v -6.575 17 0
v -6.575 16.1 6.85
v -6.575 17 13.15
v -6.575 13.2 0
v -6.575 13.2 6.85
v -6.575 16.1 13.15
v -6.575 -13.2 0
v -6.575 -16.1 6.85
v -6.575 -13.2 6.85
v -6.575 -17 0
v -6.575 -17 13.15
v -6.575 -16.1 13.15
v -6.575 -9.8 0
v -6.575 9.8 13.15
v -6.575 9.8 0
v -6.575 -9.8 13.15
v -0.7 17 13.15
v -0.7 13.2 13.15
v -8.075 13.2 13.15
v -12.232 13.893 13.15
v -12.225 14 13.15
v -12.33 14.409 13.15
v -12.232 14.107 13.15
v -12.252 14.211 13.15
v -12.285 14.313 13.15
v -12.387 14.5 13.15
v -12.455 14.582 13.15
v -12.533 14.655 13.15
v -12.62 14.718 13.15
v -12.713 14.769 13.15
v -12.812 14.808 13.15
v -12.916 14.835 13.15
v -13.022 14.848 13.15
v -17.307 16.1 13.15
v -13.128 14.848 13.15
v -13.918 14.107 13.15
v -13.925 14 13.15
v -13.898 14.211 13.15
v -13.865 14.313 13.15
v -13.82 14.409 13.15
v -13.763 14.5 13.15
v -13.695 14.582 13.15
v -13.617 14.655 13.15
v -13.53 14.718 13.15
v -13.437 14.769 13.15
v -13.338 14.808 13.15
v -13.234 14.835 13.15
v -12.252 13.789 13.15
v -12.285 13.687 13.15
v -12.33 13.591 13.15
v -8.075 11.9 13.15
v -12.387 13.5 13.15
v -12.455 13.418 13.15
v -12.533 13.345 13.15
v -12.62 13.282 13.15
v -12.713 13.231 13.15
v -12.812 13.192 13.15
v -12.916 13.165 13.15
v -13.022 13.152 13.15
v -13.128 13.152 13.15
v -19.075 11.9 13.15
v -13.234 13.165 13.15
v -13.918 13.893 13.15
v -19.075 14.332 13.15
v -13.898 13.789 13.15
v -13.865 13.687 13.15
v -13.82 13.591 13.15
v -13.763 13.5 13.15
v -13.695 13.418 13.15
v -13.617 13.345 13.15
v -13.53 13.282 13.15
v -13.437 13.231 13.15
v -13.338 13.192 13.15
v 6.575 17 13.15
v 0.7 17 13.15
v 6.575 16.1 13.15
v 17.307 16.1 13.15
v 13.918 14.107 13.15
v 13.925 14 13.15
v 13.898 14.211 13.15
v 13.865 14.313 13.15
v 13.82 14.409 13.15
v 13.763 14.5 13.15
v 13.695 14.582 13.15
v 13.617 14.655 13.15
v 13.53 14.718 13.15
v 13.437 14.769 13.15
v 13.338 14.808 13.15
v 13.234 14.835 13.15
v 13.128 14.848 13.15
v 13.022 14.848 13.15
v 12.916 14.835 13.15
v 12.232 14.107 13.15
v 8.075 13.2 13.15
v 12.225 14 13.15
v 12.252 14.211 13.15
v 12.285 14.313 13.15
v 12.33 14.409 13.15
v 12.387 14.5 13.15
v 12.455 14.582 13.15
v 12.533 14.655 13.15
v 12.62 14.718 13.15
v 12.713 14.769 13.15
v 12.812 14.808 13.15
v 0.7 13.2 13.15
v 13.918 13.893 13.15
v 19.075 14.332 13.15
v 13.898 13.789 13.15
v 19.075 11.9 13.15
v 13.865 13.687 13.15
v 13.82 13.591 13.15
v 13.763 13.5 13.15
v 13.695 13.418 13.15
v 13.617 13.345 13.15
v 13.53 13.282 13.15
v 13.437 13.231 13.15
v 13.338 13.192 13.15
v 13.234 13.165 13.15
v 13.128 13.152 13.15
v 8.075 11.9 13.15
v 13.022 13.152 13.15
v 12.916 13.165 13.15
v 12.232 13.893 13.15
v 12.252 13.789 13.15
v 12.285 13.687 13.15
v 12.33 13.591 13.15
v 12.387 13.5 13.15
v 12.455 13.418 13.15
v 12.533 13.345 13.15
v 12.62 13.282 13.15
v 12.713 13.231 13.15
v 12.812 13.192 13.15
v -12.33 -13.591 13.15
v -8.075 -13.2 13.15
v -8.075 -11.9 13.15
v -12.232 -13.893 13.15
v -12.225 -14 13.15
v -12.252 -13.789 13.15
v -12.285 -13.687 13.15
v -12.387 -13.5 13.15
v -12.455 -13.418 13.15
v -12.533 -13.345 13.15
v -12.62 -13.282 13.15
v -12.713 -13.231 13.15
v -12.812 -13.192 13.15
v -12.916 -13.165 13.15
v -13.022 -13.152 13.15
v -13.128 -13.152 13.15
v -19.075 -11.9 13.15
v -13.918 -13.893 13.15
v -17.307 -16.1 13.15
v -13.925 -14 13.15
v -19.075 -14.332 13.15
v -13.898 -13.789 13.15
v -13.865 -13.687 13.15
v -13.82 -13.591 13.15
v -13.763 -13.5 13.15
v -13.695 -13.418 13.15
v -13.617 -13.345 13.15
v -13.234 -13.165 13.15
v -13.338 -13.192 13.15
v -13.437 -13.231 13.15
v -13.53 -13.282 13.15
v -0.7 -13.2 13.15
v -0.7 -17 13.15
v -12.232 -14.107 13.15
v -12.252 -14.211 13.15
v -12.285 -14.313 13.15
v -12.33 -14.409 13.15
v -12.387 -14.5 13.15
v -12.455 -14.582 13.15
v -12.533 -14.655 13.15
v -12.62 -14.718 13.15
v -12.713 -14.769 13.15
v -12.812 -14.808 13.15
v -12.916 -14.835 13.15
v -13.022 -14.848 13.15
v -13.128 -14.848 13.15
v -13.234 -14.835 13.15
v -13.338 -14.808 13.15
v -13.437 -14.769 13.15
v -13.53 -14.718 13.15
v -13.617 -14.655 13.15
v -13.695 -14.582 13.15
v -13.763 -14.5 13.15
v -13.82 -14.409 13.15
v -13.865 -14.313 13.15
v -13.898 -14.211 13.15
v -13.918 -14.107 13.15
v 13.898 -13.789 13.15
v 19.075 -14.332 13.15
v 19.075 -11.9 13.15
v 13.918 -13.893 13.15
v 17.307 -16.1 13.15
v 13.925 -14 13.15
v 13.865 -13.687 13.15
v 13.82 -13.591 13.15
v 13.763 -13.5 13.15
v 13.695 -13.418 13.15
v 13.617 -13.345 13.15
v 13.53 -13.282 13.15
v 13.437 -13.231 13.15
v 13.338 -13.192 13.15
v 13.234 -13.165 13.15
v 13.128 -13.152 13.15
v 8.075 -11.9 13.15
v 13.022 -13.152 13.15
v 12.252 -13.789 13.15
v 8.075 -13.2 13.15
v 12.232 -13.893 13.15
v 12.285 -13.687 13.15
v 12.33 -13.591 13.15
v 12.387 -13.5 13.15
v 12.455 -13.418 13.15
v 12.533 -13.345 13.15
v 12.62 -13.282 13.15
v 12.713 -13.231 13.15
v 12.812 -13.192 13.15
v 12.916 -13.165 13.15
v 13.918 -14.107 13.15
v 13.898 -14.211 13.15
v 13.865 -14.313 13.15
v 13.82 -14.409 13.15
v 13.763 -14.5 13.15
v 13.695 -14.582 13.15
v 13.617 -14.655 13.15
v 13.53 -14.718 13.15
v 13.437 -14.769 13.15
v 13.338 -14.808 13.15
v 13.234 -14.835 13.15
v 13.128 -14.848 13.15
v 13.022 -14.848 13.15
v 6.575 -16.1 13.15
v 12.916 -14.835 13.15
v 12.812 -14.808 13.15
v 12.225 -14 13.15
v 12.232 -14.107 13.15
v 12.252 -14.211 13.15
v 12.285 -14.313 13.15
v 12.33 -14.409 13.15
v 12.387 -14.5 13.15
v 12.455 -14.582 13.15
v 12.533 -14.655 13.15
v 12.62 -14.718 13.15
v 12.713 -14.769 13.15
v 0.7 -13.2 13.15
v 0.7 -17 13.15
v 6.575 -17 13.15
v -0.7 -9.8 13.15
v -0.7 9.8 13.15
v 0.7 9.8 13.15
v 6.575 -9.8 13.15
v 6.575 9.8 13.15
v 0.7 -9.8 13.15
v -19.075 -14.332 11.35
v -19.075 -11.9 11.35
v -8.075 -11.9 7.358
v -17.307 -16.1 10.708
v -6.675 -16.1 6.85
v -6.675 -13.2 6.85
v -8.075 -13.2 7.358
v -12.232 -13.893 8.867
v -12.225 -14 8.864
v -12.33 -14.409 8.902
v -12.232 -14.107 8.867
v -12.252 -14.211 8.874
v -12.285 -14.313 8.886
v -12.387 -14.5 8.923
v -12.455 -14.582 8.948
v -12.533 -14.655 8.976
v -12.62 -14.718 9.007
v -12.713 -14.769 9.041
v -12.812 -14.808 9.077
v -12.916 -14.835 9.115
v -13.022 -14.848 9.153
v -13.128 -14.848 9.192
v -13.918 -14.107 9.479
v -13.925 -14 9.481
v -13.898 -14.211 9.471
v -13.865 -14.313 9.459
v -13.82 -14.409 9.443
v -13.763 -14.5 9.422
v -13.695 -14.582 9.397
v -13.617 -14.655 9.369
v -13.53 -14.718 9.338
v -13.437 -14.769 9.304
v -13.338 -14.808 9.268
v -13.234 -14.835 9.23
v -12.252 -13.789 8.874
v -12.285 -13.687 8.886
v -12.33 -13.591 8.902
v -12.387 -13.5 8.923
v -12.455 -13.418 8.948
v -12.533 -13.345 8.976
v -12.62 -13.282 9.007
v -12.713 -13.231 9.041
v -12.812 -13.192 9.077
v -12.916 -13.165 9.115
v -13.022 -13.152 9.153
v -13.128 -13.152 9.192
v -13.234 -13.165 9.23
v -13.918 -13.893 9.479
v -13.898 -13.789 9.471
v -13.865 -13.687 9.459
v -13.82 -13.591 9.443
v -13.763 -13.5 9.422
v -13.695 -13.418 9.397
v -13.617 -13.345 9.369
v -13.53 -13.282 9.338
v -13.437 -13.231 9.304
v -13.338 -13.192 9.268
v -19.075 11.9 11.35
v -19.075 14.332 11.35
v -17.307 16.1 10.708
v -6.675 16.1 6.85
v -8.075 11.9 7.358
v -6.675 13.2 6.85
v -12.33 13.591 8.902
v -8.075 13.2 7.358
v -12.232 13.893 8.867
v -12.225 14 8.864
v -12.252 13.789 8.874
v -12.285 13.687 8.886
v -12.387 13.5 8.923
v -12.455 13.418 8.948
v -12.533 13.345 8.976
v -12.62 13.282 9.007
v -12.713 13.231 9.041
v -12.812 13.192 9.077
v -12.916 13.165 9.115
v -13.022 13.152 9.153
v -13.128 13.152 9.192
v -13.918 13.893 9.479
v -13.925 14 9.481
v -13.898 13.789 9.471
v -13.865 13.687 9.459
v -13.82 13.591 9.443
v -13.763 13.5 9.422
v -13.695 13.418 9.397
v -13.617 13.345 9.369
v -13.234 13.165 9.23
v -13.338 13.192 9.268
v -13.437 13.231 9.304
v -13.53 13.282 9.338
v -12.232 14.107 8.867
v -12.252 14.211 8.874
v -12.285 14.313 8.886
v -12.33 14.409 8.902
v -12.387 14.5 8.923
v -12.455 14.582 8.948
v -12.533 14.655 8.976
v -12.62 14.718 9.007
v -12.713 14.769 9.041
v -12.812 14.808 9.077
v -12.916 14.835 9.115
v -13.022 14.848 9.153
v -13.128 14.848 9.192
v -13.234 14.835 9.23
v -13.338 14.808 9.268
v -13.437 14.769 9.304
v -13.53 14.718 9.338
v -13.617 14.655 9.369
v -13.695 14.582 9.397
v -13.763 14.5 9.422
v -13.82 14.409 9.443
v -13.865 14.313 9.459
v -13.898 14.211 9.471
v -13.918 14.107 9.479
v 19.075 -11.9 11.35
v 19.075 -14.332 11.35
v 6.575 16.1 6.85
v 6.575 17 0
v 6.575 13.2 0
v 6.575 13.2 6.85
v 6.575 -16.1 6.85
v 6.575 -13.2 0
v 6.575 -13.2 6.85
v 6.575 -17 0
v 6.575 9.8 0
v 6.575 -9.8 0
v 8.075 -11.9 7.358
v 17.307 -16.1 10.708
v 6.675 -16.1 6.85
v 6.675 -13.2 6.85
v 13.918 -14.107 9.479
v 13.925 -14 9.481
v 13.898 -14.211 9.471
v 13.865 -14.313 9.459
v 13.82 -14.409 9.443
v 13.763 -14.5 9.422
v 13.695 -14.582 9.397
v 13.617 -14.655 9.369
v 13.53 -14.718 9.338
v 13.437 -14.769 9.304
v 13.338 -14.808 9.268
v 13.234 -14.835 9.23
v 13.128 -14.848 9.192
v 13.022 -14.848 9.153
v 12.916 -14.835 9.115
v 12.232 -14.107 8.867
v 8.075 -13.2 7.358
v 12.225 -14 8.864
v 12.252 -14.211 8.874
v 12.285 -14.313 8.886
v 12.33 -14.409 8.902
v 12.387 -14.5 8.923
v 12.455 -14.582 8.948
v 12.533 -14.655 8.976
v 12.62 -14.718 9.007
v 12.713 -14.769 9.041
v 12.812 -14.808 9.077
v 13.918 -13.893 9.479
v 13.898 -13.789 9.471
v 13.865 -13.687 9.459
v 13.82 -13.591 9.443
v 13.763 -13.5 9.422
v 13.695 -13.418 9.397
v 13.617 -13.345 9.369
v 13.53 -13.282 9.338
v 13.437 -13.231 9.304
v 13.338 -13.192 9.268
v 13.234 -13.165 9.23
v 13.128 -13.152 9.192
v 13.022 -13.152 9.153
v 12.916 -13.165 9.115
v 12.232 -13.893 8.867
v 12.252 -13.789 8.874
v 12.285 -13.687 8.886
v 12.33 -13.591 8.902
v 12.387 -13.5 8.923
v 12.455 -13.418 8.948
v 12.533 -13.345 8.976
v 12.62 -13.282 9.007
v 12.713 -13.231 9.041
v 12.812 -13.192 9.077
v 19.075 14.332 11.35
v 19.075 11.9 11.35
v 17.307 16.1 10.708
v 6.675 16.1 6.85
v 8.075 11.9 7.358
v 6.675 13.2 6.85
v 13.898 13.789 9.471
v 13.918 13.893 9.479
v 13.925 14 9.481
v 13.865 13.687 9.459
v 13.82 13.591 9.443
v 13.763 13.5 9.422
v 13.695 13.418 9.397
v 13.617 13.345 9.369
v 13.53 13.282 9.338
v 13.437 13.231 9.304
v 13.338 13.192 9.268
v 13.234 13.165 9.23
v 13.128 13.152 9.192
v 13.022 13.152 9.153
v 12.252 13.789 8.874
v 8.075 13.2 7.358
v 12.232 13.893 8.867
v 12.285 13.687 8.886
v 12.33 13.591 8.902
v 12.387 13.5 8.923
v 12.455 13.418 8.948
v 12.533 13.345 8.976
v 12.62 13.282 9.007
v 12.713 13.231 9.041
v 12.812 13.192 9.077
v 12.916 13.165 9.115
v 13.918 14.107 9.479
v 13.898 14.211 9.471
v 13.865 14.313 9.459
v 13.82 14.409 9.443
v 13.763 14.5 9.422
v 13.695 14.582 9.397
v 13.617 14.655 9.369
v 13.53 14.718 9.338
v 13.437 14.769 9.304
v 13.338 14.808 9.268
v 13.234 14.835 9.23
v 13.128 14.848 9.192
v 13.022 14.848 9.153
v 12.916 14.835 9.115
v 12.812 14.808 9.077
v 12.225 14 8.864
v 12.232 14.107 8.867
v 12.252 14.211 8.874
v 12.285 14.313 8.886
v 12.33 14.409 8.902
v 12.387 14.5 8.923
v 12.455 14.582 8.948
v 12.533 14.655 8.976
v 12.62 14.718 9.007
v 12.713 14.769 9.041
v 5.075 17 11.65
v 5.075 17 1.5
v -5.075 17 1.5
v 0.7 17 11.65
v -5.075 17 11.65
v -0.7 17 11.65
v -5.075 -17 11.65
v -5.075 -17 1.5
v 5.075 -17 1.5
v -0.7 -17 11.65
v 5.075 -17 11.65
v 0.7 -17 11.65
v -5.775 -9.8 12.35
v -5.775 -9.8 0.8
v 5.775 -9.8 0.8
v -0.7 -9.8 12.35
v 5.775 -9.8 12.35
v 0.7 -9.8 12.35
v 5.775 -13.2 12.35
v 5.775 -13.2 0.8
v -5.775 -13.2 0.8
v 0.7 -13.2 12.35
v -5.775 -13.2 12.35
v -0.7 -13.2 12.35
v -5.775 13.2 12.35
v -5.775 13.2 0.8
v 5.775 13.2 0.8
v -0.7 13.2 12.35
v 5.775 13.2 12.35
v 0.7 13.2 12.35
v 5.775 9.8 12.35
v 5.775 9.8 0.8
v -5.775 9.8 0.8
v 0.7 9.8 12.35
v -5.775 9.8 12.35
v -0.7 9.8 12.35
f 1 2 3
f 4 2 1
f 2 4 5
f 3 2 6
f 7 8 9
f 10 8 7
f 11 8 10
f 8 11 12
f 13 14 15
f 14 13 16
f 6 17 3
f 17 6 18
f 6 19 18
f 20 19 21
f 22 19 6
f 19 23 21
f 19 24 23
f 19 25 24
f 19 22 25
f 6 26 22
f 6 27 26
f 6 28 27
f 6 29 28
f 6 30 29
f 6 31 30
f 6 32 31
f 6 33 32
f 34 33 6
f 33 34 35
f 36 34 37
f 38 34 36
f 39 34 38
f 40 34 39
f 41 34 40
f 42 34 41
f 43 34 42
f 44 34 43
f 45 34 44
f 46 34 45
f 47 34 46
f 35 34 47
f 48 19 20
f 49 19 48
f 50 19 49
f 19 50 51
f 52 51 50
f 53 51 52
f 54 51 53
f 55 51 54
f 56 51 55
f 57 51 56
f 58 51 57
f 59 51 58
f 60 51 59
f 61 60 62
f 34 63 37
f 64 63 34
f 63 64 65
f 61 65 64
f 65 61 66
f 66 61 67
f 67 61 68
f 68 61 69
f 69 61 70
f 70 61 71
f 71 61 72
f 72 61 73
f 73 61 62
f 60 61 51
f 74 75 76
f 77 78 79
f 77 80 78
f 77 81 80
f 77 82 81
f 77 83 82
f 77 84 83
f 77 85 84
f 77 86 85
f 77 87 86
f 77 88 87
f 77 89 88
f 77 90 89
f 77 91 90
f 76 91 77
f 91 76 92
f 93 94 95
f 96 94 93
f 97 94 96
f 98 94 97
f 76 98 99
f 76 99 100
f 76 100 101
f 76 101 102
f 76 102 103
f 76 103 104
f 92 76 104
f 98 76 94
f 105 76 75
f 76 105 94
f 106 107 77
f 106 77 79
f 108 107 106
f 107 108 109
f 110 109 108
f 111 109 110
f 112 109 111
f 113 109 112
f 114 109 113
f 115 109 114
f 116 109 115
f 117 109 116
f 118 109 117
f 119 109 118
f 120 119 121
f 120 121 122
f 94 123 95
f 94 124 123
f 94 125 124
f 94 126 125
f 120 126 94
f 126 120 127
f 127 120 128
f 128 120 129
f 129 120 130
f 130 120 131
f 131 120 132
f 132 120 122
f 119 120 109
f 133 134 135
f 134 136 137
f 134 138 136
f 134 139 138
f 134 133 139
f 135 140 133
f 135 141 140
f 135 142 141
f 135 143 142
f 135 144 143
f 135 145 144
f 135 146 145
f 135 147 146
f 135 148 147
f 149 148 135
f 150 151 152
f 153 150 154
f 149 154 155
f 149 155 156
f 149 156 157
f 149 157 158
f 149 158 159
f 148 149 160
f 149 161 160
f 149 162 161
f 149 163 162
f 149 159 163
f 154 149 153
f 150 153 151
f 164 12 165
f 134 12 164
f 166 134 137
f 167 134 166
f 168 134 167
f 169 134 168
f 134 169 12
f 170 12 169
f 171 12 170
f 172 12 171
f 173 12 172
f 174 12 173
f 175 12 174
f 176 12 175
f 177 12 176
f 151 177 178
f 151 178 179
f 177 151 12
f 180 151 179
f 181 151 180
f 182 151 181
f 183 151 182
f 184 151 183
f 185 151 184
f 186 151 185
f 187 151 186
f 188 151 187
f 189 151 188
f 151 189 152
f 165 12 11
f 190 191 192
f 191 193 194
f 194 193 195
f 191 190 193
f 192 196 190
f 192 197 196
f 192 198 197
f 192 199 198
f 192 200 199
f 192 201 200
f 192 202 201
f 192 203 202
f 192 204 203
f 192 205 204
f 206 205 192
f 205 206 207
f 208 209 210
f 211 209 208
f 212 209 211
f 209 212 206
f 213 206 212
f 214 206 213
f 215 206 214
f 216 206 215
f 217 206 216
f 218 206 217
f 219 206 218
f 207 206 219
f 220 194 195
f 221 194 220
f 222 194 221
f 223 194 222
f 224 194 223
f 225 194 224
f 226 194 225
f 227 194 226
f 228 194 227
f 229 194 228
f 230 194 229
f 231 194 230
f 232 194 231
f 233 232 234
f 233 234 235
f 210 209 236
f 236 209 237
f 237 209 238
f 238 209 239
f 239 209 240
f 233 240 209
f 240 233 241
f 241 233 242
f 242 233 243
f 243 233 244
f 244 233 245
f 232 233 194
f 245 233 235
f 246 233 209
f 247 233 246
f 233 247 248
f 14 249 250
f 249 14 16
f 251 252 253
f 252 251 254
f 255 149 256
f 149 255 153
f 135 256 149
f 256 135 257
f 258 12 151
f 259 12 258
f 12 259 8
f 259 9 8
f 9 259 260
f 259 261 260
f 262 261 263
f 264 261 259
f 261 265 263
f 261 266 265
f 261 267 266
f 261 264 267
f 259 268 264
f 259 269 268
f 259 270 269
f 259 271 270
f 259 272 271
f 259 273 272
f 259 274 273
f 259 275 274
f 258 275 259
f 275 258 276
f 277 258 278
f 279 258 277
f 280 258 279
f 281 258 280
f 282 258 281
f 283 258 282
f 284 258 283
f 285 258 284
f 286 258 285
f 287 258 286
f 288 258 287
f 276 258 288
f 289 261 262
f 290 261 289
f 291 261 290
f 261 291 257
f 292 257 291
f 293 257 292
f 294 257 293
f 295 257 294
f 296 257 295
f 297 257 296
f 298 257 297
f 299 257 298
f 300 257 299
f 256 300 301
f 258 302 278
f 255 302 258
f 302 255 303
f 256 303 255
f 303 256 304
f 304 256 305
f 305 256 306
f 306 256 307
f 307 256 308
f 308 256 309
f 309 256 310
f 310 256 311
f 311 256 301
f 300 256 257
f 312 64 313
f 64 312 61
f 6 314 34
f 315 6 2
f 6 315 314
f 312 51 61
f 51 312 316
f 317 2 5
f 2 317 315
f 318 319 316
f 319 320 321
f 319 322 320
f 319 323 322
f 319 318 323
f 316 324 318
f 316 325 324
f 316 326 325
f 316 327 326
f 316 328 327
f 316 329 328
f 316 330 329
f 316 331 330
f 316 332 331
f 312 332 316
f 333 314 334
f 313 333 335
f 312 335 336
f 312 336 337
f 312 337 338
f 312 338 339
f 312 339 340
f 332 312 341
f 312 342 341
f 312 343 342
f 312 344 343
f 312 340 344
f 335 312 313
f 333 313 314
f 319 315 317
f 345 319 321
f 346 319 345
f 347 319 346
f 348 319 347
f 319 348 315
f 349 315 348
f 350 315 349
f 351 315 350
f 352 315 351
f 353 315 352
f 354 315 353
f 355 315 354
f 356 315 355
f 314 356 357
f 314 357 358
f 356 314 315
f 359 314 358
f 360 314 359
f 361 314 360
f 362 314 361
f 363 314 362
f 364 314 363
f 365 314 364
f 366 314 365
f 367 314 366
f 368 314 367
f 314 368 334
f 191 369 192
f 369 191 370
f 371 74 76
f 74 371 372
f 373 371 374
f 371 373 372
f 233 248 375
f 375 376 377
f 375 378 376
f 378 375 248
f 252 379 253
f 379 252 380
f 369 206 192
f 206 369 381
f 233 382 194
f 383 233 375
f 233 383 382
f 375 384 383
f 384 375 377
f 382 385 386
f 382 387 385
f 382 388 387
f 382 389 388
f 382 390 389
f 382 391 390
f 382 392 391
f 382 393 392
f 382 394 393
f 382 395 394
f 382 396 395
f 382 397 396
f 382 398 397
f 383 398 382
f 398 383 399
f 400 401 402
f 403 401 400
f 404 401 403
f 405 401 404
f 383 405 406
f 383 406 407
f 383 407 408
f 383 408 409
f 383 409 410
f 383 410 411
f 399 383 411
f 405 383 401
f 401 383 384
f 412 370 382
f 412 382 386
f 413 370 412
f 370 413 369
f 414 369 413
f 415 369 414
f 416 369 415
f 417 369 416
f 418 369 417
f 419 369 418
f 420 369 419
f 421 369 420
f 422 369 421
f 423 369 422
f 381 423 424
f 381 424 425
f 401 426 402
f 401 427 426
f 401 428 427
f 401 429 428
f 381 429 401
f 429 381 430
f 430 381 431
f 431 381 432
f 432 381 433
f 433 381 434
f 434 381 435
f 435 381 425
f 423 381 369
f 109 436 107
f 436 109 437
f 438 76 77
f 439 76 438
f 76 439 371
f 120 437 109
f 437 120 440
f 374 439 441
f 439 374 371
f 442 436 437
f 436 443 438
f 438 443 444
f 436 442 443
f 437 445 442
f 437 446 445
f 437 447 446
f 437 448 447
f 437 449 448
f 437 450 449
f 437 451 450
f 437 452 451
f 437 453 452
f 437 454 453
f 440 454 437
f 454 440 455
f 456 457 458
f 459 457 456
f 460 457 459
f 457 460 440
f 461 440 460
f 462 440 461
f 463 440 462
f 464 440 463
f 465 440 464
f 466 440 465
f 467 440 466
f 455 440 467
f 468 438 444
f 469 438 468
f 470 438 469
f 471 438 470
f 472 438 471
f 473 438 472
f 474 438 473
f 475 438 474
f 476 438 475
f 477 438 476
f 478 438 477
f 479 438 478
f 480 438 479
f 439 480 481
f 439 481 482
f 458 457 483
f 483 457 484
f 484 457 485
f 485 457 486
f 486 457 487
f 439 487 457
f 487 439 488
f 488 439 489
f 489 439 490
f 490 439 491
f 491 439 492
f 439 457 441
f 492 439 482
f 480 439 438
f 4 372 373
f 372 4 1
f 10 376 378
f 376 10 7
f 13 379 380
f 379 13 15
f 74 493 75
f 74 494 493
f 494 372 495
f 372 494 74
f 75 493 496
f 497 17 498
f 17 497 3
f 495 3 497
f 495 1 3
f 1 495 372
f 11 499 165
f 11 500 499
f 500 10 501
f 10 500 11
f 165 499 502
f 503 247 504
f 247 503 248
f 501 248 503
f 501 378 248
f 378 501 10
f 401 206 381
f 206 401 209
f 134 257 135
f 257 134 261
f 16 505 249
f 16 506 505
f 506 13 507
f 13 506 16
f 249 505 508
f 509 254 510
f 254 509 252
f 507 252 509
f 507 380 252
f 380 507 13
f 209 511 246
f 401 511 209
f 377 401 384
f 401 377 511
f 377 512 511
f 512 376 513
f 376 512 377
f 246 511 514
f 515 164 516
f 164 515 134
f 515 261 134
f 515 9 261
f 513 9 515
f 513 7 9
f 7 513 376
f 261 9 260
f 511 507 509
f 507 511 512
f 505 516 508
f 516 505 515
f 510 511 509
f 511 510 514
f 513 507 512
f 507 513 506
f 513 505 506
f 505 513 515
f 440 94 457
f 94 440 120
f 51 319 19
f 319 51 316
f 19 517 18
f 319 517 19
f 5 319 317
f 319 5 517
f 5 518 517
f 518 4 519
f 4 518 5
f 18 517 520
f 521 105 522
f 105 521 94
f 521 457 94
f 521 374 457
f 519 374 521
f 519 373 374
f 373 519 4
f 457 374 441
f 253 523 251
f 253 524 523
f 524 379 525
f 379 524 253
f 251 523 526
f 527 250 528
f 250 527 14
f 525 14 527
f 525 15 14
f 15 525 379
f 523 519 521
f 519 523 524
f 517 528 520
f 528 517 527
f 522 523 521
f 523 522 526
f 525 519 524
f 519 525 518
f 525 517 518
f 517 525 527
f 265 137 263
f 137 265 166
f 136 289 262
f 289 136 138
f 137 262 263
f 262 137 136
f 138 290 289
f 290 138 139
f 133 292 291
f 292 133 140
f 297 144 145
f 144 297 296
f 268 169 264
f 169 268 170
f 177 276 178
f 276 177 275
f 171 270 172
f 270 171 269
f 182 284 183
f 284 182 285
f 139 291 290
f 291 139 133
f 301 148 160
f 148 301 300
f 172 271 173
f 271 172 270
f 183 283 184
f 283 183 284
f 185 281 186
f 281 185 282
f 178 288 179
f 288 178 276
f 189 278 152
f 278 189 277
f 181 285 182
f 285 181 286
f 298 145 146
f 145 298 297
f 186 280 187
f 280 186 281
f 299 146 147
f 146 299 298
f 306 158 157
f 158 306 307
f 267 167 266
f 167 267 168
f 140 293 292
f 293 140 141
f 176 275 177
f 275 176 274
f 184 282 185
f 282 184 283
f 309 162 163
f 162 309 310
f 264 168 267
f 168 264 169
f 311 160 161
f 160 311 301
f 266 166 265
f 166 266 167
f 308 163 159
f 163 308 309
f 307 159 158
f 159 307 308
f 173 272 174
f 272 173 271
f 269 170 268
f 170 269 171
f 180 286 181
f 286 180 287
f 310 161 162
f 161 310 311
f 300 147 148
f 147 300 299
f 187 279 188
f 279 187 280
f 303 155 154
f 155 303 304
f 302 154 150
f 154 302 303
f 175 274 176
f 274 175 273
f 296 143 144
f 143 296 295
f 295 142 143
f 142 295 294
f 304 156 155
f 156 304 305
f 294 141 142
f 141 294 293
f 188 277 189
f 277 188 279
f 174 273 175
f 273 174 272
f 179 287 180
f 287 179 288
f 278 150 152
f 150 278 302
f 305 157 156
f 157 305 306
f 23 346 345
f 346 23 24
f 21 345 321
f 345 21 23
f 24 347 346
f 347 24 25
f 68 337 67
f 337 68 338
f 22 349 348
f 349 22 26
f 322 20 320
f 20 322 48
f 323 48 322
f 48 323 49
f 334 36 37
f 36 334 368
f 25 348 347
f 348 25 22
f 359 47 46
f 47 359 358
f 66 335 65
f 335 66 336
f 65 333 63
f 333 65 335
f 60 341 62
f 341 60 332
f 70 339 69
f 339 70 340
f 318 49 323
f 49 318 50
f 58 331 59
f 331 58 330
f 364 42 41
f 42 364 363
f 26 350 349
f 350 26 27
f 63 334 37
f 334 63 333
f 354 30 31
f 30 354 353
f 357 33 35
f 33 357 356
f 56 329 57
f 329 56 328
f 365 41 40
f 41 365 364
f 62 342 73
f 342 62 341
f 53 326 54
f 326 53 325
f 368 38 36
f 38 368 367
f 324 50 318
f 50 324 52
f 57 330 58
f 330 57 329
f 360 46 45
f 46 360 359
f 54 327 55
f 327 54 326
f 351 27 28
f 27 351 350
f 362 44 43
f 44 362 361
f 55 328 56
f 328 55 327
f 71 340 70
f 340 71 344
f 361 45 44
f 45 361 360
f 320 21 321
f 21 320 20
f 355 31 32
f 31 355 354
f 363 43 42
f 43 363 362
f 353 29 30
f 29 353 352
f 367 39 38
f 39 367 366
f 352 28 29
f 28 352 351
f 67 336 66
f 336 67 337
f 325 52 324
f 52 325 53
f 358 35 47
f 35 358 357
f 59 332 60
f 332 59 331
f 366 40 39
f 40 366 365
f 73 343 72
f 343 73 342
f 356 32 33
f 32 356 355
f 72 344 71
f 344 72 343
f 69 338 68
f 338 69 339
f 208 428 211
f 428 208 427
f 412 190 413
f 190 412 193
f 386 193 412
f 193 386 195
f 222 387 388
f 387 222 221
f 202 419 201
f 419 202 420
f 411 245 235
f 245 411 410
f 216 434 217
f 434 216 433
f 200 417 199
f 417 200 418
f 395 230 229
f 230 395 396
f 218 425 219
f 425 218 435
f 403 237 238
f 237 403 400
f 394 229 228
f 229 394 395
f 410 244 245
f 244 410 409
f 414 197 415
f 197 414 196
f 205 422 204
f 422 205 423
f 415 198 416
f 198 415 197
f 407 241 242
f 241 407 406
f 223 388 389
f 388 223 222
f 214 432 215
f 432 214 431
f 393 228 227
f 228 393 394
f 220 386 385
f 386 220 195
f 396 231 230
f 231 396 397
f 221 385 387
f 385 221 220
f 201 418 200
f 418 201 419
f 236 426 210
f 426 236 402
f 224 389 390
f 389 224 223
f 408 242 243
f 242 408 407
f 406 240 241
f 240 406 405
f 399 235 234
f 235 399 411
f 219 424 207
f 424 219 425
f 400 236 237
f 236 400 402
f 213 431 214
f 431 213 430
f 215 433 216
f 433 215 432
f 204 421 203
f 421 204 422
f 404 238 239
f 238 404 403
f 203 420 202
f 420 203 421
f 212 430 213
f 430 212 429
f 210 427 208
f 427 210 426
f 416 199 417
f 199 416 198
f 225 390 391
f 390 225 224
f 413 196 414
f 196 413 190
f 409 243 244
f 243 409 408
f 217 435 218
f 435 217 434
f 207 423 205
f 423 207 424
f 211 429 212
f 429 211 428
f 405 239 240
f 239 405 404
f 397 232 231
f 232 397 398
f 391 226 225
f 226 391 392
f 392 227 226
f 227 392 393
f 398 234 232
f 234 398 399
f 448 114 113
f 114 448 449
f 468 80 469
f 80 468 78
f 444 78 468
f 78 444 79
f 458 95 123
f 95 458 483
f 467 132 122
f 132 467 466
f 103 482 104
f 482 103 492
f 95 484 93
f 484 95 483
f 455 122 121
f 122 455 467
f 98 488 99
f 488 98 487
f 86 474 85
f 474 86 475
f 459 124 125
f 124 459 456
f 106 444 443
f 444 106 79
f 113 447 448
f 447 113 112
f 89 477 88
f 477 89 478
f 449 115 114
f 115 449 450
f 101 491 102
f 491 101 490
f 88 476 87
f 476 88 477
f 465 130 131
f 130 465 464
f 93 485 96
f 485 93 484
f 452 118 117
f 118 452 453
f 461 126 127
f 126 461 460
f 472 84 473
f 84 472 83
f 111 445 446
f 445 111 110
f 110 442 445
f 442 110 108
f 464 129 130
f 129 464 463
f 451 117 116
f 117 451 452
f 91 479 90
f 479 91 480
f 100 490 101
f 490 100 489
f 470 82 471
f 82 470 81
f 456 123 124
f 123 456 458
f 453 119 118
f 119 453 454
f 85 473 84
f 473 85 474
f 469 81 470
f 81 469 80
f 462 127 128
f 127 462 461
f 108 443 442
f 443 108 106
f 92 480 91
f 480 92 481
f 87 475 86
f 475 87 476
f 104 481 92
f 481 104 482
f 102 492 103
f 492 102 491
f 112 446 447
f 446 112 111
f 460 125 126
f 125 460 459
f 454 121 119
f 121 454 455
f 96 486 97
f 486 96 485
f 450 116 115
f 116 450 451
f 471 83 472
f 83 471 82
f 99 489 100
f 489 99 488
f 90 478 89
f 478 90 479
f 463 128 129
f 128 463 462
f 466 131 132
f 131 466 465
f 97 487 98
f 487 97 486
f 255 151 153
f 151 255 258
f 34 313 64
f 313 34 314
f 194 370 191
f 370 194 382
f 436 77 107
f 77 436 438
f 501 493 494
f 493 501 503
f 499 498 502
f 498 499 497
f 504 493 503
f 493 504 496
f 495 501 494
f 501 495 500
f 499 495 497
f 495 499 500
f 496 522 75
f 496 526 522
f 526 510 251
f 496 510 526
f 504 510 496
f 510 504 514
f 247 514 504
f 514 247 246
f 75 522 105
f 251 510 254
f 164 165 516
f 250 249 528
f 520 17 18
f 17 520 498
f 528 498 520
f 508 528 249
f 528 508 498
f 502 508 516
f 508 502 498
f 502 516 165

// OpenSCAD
// ===================================================================
// Project: OpenStickFPV
// Component: Ultra-Slim Open-Frame 9g Servo Mount for 10x10mm Spar
// - Minimalist open mounting tabs with low-profile thickness (1.8mm)
// - Sized for short servo screws (5mm-6mm thread length)
// - Opposed transverse mounting for direct rudder & elevator pushrod runs
// - Dual zip-tie retention channels around 10x10mm spar
// - Full-length longitudinal pinch slit for compression clamping
// - 100% support-free 3D printing
// ===================================================================

$fn = 50;

// --- Fuselage Spar Spec (10x10mm Square) ---
spar_width           = 10.15;  // 10x10mm spar (+0.15mm printer tolerance)
spar_height          = 10.15;  // 10x10mm spar height
sleeve_wall          = 1.5;    // Thin structural collar wall
sleeve_length        = 34.0;   // Length along fuselage (Y-axis)

// --- Spar Zip-Tie Clamp Spec ---
ziptie_width         = 3.4;    // Fits up to 2.8mm cable ties
ziptie_depth         = 0.8;    // Recessed channel depth
ziptie_inset         = 5.5;    // Inset from ends
slit_width           = 1.4;    // Top compression slit

// --- 9g Servo Low-Profile Tab Geometry ---
servo_tab_spacing    = 28.0;   // Standard 9g center-to-center hole pitch
lug_thickness_y      = 4.2;    // Width of mounting lug along fuselage (Y-axis)
lug_outreach_x       = 12.5;   // Extension from collar side wall
lug_height_z         = 1.8;    // Reduced pad thickness for short screws
servo_screw_d        = 1.7;    // Pilot hole for micro servo screws
screw_hole_inset_x   = 6.5;    // Hole center from collar wall

// Derived Collar Dimensions
collar_w = spar_width + 2 * sleeve_wall;  // ~13.15mm
collar_h = spar_height + 2 * sleeve_wall; // ~13.15mm

module ultra_slim_9g_servo_mount() {
    difference() {
        // -------------------------------------------------------------
        // 1. ADDITIVE SHAPES (Spar Collar + Slim Mounting Lugs)
        // -------------------------------------------------------------
        union() {
            // Main central 10x10mm spar collar
            translate([-collar_w/2, -sleeve_length/2, 0])
                cube([collar_w, sleeve_length, collar_h]);

            // Low-profile mounting lugs extending out left (-X) and right (+X)
            for (sx = [-1, 1]) {
                for (sy = [-1, 1]) {
                    // Slim mounting tab pad
                    translate([
                        sx > 0 ? collar_w/2 : -collar_w/2 - lug_outreach_x,
                        sy * (servo_tab_spacing / 2) - lug_thickness_y / 2,
                        collar_h - lug_height_z
                    ])
                        cube([lug_outreach_x, lug_thickness_y, lug_height_z]);

                    // Low-angle stiffening gusset directly beneath the thin pad
                    hull() {
                        translate([
                            sx > 0 ? collar_w/2 : -collar_w/2 - lug_outreach_x,
                            sy * (servo_tab_spacing / 2) - lug_thickness_y / 2,
                            collar_h - lug_height_z
                        ])
                            cube([lug_outreach_x, lug_thickness_y, 0.1]);

                        translate([
                            sx > 0 ? collar_w/2 : -collar_w/2 - 0.1,
                            sy * (servo_tab_spacing / 2) - lug_thickness_y / 2,
                            collar_h - lug_height_z - 4.5
                        ])
                            cube([0.1, lug_thickness_y, 0.1]);
                    }
                }
            }
        }

        // -------------------------------------------------------------
        // 2. 10x10mm SPAR CAVITY (Centered along Y-axis)
        // -------------------------------------------------------------
        translate([-spar_width/2, -sleeve_length/2 - 1, sleeve_wall])
            cube([spar_width, sleeve_length + 2, spar_height]);

        // -------------------------------------------------------------
        // 3. DUAL ZIP-TIE RETENTION GROOVES
        // -------------------------------------------------------------
        for (sy = [-1, 1]) {
            translate([0, sy * (sleeve_length/2 - ziptie_inset), collar_h/2])
                difference() {
                    cube([collar_w + 3, ziptie_width, collar_h + 3], center = true);
                    cube([
                        collar_w - 2 * ziptie_depth,
                        ziptie_width + 1,
                        collar_h - 2 * ziptie_depth
                    ], center = true);
                }
        }

        // -------------------------------------------------------------
        // 4. LONGITUDINAL TOP COMPRESSION SLIT
        // -------------------------------------------------------------
        translate([-slit_width/2, -sleeve_length/2 - 1, spar_height/2])
            cube([slit_width, sleeve_length + 2, collar_h]);

        // -------------------------------------------------------------
        // 5. SERVO MOUNTING SCREW PILOT HOLES
        // -------------------------------------------------------------
        // Clean through-holes through the slim pads
        for (sx = [-1, 1]) {
            for (sy = [-1, 1]) {
                translate([
                    sx * (collar_w/2 + screw_hole_inset_x),
                    sy * (servo_tab_spacing / 2),
                    collar_h - lug_height_z - 10
                ])
                    cylinder(d = servo_screw_d, h = lug_height_z + 20);
            }
        }

        // -------------------------------------------------------------
        // 6. OUTER CORNER CHAMFERS
        // -------------------------------------------------------------
        for (sx = [-1, 1]) {
            for (sy = [-1, 1]) {
                translate([
                    sx * (collar_w/2 + lug_outreach_x),
                    sy * (servo_tab_spacing / 2 + lug_thickness_y / 2),
                    collar_h
                ])
                    rotate([0, 0, 45])
                    cube([2.5, 2.5, lug_height_z * 4], center = true);
            }
        }
    }
}

ultra_slim_9g_servo_mount();
